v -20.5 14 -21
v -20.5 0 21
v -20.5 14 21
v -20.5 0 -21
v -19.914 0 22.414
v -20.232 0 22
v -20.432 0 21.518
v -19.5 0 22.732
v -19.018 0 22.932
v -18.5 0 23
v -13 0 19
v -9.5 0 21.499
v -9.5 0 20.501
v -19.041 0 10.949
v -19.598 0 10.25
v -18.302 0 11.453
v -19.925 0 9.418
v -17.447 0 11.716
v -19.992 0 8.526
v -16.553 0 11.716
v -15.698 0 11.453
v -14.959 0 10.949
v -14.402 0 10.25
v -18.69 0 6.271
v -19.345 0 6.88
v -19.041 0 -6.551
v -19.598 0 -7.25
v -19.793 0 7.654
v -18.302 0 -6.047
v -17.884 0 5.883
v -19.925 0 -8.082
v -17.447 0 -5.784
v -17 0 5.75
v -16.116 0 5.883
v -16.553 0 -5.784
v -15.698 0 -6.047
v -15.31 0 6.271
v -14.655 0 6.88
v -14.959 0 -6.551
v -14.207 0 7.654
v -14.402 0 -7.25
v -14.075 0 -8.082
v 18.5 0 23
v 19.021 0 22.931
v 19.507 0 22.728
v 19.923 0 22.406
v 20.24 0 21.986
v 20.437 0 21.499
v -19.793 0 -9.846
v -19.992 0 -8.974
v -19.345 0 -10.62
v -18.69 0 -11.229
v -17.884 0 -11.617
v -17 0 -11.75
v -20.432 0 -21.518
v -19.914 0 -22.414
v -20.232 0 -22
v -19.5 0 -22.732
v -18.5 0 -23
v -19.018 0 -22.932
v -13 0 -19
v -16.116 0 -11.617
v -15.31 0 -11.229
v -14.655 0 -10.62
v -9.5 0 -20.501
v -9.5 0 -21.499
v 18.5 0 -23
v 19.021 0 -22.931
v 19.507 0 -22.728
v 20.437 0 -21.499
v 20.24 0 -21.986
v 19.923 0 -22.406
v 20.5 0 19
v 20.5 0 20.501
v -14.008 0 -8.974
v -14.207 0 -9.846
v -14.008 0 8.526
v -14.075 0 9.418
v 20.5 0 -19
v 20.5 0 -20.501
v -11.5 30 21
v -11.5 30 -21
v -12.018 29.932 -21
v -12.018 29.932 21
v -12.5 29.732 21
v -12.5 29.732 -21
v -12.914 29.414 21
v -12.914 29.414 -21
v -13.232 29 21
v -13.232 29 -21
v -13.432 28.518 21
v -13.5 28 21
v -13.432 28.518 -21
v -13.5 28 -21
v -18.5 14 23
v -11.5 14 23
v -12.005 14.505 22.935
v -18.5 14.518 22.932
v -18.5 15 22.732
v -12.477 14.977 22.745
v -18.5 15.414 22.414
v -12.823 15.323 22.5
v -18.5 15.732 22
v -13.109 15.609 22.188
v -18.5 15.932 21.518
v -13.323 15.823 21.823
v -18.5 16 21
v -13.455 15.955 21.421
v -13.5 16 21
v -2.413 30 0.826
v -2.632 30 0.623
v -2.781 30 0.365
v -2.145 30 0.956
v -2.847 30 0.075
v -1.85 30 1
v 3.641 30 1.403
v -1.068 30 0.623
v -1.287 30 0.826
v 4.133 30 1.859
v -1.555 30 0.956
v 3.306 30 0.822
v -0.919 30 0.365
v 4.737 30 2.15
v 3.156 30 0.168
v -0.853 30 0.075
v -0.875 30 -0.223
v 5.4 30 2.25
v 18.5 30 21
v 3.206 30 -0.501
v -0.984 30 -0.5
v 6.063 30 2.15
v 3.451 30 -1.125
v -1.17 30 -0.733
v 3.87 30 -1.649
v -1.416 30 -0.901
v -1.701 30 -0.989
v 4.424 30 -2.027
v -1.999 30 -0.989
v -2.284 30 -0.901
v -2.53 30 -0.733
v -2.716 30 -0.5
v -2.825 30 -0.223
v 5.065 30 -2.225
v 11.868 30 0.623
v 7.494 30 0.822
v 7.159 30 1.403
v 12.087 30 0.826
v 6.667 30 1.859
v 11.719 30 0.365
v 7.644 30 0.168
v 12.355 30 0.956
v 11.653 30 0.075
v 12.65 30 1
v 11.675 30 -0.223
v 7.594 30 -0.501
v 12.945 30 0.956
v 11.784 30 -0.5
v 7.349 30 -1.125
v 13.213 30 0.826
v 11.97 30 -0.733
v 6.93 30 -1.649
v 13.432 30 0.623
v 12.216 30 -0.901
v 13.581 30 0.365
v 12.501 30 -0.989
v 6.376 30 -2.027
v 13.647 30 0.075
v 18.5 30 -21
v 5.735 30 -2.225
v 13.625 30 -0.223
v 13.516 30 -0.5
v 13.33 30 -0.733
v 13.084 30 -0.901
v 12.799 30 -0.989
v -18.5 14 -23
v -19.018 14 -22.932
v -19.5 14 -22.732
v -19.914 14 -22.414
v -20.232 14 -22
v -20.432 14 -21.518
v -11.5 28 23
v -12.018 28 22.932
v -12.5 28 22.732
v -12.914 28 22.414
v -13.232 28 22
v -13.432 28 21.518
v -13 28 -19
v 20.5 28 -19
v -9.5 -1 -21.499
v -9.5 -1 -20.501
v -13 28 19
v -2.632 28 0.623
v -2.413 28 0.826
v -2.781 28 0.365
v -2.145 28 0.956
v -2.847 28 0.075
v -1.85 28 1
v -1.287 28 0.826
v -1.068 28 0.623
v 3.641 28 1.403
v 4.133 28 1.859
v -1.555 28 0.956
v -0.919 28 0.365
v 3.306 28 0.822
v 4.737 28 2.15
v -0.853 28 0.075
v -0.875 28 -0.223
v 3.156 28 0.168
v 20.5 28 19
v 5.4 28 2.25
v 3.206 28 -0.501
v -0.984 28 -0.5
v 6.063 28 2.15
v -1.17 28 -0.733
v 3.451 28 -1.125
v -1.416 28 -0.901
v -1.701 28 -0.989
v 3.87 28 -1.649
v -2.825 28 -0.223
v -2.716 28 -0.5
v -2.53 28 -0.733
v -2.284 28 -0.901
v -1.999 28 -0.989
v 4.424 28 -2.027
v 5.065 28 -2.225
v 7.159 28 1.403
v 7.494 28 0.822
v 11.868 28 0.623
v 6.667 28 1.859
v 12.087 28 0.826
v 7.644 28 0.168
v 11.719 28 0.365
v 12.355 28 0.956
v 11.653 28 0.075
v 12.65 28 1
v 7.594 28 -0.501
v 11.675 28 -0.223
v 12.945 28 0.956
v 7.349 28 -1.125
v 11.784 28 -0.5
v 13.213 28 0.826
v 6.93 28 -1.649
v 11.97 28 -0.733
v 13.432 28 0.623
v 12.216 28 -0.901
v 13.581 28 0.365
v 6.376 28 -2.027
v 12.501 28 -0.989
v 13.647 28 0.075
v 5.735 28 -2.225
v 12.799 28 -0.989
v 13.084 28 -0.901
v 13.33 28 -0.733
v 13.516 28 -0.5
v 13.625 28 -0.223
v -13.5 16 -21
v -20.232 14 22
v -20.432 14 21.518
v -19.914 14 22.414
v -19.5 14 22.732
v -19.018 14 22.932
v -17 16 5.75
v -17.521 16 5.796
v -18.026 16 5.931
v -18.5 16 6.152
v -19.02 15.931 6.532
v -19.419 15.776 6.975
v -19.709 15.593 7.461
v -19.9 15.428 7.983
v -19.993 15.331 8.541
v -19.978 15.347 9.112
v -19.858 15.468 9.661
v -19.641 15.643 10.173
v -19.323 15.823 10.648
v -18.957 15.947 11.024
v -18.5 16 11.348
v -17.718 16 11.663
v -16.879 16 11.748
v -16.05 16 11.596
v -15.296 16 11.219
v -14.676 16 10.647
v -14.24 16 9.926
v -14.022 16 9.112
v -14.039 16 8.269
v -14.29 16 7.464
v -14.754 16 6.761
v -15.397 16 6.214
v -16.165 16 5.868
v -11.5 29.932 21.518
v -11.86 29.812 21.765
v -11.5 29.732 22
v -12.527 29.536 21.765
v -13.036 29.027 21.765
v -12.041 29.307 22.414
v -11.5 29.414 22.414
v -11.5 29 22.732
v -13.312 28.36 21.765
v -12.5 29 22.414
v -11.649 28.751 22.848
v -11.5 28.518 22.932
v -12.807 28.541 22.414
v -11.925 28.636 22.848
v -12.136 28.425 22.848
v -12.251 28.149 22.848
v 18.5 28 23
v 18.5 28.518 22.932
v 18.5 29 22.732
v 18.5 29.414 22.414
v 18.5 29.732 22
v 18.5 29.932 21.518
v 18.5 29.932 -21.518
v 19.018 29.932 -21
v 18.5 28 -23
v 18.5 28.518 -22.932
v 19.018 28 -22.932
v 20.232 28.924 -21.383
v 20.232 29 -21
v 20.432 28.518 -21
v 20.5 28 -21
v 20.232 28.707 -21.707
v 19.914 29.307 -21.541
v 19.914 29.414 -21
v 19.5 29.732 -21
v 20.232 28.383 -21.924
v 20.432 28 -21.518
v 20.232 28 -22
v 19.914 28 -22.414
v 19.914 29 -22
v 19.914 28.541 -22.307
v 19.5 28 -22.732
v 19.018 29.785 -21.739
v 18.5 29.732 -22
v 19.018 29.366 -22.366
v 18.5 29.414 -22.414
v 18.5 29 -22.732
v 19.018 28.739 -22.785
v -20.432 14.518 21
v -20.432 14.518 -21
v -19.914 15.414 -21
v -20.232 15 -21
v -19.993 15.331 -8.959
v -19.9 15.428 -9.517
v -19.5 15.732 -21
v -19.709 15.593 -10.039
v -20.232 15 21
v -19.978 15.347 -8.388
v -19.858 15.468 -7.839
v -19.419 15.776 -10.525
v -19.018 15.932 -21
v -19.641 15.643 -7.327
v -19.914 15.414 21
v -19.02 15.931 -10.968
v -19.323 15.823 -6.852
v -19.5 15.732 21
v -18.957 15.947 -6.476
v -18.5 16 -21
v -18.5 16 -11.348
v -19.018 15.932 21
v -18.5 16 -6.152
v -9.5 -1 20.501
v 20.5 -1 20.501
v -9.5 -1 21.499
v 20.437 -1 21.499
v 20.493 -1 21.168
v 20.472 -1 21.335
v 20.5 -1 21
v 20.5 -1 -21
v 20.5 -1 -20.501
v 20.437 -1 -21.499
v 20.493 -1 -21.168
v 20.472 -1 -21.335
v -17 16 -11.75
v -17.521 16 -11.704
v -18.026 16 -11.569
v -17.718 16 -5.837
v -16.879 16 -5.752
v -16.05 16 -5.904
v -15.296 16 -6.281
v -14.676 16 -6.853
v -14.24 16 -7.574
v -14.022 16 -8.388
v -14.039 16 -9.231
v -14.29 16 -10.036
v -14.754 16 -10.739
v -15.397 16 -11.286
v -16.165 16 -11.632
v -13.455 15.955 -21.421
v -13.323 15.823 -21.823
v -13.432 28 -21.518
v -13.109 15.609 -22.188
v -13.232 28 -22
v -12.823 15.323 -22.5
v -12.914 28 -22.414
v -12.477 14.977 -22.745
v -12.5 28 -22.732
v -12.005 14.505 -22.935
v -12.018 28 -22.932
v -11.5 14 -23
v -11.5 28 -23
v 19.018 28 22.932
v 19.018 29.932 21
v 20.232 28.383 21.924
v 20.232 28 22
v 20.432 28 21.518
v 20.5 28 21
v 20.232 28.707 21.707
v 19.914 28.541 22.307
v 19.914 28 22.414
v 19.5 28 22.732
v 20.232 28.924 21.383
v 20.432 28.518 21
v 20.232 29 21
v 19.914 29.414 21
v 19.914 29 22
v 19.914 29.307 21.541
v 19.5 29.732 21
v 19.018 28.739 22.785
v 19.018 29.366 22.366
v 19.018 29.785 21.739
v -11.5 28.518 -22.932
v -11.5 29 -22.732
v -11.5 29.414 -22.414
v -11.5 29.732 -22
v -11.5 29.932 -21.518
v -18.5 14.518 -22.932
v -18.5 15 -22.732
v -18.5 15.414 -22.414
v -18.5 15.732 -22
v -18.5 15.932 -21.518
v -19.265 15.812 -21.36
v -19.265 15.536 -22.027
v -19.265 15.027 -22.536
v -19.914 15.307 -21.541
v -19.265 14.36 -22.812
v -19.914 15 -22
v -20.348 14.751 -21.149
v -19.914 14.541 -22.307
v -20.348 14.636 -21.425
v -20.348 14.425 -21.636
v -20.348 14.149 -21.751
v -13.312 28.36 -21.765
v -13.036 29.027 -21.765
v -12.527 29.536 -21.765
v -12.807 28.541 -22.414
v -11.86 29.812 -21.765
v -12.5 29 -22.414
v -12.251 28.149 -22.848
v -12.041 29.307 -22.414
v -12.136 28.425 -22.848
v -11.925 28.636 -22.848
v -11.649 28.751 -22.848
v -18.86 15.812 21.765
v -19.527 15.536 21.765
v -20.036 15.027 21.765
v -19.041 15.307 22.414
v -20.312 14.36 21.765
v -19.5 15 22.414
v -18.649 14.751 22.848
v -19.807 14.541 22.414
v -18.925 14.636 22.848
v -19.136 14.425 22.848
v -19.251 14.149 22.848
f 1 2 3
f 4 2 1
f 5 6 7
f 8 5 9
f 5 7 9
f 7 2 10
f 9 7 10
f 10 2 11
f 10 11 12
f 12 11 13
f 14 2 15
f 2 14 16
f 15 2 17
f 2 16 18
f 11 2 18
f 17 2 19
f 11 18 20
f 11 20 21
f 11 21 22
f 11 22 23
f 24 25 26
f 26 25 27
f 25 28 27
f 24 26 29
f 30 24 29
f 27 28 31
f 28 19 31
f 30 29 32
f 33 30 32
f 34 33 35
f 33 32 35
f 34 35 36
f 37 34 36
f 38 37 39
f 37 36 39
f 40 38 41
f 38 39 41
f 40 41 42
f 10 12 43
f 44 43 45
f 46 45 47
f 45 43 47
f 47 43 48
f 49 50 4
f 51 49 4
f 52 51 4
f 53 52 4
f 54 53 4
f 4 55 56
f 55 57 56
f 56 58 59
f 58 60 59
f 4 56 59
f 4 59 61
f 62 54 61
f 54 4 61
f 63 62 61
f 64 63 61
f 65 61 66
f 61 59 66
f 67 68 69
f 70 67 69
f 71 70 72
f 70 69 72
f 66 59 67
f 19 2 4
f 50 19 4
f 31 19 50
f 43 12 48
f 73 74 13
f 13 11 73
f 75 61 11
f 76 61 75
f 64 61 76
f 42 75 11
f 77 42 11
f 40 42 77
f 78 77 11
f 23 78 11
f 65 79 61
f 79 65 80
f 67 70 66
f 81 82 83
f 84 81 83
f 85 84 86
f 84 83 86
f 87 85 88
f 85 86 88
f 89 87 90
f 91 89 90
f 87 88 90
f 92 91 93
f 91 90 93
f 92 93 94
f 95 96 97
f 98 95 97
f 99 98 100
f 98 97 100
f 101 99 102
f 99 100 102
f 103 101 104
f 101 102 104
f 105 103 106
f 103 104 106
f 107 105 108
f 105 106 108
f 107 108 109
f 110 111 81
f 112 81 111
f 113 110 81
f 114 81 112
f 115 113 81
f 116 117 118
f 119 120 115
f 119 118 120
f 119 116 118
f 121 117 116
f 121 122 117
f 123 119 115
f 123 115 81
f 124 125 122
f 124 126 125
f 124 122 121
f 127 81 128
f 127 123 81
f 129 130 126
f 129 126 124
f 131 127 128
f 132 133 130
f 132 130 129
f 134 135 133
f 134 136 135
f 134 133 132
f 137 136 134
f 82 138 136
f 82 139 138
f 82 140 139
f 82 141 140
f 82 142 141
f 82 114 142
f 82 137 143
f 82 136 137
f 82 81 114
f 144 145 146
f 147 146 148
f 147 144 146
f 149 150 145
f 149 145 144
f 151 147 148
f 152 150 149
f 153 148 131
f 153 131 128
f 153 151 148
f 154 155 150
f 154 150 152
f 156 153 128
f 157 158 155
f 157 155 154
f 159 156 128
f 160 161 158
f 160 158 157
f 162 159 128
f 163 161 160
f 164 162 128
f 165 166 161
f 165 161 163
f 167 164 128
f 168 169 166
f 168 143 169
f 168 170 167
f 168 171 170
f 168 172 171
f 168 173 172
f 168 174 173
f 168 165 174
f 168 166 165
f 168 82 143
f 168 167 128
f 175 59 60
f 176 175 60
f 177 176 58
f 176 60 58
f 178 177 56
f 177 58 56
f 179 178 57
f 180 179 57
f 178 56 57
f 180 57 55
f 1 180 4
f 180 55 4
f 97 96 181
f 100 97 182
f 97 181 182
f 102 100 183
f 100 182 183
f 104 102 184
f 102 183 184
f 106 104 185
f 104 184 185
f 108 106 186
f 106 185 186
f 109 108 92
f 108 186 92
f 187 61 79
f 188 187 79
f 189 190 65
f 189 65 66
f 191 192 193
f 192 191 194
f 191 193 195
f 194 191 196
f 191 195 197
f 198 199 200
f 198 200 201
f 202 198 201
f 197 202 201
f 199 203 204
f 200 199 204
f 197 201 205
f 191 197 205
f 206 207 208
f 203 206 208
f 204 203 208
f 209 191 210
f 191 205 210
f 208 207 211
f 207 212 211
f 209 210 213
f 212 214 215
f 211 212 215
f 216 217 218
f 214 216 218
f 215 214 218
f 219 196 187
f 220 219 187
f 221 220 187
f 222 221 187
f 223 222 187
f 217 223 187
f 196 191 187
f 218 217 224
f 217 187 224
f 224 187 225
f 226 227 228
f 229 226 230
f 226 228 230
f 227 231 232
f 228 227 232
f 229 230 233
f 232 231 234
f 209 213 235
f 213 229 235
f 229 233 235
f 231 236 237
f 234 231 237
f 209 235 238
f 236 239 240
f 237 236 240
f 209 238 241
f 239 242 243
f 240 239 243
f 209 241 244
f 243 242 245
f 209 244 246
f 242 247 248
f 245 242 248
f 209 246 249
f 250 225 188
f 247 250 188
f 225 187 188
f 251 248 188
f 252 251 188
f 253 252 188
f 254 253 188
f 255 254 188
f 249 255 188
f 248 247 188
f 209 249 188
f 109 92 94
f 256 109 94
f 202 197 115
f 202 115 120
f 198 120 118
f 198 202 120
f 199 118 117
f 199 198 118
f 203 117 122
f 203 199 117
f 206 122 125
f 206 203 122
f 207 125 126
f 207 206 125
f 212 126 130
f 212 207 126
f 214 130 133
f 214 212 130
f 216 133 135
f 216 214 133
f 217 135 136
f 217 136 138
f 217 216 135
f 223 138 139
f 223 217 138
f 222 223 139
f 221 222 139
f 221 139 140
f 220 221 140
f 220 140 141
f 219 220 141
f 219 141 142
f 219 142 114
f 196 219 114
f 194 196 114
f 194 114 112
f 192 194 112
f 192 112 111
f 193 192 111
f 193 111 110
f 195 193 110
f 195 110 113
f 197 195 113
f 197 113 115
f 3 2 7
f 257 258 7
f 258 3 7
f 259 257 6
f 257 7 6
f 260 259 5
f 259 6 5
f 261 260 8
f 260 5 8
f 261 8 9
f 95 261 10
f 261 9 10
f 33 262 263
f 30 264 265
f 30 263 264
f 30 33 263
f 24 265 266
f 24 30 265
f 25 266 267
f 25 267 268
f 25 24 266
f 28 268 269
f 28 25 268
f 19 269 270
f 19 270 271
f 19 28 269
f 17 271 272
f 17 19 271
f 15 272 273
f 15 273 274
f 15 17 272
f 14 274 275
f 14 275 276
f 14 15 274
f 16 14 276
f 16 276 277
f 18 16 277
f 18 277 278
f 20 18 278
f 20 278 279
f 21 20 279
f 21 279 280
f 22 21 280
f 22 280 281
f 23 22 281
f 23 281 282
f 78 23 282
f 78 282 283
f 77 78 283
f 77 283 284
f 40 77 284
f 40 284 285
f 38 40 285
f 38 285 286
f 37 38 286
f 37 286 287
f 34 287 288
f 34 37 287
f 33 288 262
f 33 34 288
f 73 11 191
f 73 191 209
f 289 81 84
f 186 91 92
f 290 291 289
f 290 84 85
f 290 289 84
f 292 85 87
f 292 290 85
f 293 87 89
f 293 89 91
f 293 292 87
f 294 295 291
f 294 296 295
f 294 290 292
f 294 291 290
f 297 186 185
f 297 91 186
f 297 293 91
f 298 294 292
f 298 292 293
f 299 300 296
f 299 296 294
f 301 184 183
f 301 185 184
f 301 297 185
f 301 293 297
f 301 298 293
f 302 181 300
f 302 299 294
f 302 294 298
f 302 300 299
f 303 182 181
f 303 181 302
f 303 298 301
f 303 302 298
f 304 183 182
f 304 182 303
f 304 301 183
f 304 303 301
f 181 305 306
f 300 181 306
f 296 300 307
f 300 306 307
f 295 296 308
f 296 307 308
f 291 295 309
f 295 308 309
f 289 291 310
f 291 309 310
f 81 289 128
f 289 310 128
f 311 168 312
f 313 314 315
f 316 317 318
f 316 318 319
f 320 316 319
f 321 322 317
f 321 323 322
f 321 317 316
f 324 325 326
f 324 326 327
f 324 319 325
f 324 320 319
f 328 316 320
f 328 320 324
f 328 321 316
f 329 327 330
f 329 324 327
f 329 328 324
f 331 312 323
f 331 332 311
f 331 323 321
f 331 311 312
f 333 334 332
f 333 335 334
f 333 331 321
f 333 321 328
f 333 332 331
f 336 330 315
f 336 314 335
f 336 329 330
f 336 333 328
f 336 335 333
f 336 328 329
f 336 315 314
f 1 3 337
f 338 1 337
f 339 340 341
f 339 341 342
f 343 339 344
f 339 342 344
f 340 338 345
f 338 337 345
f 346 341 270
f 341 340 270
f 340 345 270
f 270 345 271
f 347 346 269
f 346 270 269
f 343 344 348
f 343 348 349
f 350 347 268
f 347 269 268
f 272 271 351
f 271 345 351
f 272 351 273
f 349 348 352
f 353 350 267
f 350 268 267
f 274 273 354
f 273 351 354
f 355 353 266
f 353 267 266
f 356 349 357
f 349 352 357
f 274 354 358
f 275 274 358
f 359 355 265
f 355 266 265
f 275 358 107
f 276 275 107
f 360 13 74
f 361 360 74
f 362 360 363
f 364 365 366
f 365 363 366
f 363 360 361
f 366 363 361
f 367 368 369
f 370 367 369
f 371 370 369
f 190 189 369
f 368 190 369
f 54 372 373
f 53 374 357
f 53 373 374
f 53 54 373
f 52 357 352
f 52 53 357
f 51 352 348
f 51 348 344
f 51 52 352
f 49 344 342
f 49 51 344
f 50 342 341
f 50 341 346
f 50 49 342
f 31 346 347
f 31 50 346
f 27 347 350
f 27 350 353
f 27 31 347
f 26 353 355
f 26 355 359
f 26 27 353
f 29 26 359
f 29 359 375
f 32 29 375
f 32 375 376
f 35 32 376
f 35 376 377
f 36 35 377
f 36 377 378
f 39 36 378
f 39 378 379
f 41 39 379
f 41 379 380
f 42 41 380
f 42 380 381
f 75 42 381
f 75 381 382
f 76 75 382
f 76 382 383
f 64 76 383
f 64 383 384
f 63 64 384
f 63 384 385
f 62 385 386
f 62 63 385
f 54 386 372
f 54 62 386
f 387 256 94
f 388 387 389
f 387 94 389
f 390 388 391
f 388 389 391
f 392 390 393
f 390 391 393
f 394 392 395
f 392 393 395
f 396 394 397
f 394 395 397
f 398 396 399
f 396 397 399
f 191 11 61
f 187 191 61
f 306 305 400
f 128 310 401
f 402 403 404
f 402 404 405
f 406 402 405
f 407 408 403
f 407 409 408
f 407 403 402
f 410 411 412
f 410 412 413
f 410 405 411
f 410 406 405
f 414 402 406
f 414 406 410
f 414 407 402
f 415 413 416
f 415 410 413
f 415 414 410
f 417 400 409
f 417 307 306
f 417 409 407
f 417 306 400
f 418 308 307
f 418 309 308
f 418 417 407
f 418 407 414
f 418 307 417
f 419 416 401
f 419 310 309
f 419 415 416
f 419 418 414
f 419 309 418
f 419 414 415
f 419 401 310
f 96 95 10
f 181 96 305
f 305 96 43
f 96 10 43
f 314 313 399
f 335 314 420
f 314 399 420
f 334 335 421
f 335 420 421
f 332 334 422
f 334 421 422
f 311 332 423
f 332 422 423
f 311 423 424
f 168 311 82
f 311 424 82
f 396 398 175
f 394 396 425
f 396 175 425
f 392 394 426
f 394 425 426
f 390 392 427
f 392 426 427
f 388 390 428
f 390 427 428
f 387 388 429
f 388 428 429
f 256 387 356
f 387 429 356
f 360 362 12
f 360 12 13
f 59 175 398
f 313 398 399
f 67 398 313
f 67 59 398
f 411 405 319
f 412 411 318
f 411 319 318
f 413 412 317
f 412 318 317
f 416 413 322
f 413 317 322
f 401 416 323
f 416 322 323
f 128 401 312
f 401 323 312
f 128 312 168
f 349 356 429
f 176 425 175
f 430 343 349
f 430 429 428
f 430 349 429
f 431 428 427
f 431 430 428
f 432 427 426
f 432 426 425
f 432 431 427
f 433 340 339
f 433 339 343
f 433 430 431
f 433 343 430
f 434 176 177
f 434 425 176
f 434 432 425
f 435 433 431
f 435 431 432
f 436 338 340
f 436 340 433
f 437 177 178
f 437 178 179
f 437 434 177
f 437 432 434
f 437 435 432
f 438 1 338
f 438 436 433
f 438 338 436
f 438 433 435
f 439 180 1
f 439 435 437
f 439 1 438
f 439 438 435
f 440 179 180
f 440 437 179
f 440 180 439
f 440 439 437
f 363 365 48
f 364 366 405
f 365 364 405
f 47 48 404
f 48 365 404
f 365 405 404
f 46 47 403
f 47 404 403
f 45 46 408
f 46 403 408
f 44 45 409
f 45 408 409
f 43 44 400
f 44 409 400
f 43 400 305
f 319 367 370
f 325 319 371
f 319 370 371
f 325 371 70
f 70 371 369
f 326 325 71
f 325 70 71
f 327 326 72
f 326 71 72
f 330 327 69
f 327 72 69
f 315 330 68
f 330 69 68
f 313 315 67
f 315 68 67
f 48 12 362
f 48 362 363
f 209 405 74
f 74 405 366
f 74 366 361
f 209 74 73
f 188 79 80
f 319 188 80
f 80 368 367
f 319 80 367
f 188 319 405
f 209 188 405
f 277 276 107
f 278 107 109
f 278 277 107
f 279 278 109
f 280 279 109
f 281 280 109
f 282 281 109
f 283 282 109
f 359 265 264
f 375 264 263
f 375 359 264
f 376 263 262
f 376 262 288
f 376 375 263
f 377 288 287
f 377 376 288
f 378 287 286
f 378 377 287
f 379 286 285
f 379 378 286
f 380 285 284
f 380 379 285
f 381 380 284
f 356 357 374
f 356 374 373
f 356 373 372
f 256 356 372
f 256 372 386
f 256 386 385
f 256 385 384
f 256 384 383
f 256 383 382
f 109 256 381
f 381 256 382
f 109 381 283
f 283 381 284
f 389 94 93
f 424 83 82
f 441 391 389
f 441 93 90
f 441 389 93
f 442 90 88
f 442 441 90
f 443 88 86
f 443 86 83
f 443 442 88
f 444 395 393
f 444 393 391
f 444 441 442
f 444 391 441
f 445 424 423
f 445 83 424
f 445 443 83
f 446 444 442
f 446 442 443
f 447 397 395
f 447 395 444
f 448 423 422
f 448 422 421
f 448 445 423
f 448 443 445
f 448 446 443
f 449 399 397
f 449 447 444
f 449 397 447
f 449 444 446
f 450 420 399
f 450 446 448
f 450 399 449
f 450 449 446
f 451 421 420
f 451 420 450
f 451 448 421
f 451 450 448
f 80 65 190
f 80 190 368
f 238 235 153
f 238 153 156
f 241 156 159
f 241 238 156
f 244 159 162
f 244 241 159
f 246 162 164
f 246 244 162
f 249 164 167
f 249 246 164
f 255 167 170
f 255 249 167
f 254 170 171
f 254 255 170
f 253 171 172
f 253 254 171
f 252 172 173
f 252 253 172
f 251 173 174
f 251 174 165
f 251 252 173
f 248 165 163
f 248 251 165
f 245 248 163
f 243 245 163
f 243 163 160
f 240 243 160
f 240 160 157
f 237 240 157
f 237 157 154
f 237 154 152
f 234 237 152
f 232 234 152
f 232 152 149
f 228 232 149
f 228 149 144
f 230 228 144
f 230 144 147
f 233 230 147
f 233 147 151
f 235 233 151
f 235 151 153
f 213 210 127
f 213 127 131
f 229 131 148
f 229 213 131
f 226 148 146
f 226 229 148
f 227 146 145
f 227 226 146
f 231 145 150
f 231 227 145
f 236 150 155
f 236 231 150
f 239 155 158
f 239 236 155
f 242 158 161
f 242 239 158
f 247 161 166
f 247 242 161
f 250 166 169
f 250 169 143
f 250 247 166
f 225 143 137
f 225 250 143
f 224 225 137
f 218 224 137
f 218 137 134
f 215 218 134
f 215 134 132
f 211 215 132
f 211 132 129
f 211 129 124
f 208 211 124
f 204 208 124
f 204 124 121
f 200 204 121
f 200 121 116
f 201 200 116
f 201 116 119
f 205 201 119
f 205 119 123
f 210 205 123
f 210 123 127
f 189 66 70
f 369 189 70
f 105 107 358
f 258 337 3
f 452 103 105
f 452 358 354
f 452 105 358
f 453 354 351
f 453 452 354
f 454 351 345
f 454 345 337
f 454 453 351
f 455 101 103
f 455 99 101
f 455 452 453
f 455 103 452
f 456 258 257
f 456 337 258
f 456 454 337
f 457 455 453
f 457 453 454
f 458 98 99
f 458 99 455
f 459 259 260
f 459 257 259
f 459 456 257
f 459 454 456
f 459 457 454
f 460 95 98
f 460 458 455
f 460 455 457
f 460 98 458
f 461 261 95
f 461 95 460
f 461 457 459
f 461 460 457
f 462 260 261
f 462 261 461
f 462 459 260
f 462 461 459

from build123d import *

# Parameters (mm, degrees)
ESQUISSE1_W                  = 41
ESQUISSE1_H                  = 46
ESQUISSE1_R                  = 2.25
ESQUISSE1_R_2                = 1
BOSS_EXTRU_1_DEPTH           = 30
ENL_V_START                  = 30
ESQUISSE2_W                  = 7
ESQUISSE2_H                  = 46
ENL_V_MAT_EXTRU_1_DEPTH      = 14
ENL_V_MAT_EXTRU_3_DEPTH      = 28.002906878
ENL_V_MAT_EXTRU_3_DEPTH_BACK = 44.002906878
ENL_V_MAT_EXTRU_3_START      = 16
ESQUISSE2_3_R                = 3
ESQUISSE3_W                  = 33.5
ESQUISSE3_H                  = 38
ENL_V_MAT_EXTRU_4_DEPTH      = 28
ESQUISSE4_W                  = 30
ESQUISSE4_H                  = 0.997507574
BOSS_EXTRU_2_DEPTH           = 1
CONG_1_R                     = 2
CONG_2_R                     = 2


# Some blends are built 0.0001 mm under size
with BuildPart() as part:
    # Esquisse1 → Boss.-Extru.1 (new body)
    with BuildSketch(Plane(origin=(0, 0, 0), x_dir=(1, 0, 0), z_dir=(0, 1, 0))):
        Rectangle(ESQUISSE1_W, ESQUISSE1_H)
        with Locations(Location((5.4, 0, 0), (0, 0, 270))):
            Circle(ESQUISSE1_R, mode=Mode.SUBTRACT)
        with Locations(Location((-1.85, 0, 0), (0, 0, 270))):
            Circle(ESQUISSE1_R_2, mode=Mode.SUBTRACT)
        with Locations(Location((12.65, 0, 0), (0, 0, 270))):
            Circle(ESQUISSE1_R_2, mode=Mode.SUBTRACT)
    extrude(amount=BOSS_EXTRU_1_DEPTH)

    # Esquisse2 → Enlèv. mat.-Extru.1 (cut)
    with BuildSketch(Plane(origin=(0, 0, 0), x_dir=(1, 0, 0), z_dir=(0, 1, 0)).offset(ENL_V_START)):
        with Locations((-17, 0)):
            Rectangle(ESQUISSE2_W, ESQUISSE2_H)
    extrude(amount=-ENL_V_MAT_EXTRU_1_DEPTH, mode=Mode.SUBTRACT)

    # Esquisse2<3> → Enlèv. mat.-Extru.3 (cut, two sides: drawn at the far end of the back side and taken through both)
    with BuildSketch(Plane(origin=(0, 0, 0), x_dir=(1, 0, 0), z_dir=(0, 1, 0)).offset(ENL_V_MAT_EXTRU_3_START - ENL_V_MAT_EXTRU_3_DEPTH_BACK)):
        with Locations(Location((-17, -8.75, 0), (0, 0, 90))):
            Circle(ESQUISSE2_3_R)
        with Locations(Location((-17, 8.75, 0), (0, 0, 90))):
            Circle(ESQUISSE2_3_R)
    extrude(amount=ENL_V_MAT_EXTRU_3_DEPTH + ENL_V_MAT_EXTRU_3_DEPTH_BACK, mode=Mode.SUBTRACT)

    # Esquisse3 → Enlèv. mat.-Extru.4 (cut)
    with BuildSketch(Plane(origin=(0, 0, 0), x_dir=(1, 0, 0), z_dir=(0, 1, 0))):
        with Locations((3.75, 0)):
            Rectangle(ESQUISSE3_W, ESQUISSE3_H)
    extrude(amount=ENL_V_MAT_EXTRU_4_DEPTH, mode=Mode.SUBTRACT)

    # Esquisse4 → Boss.-Extru.2 (add)
    with BuildSketch(Plane(origin=(0, 0, 0), x_dir=(1, 0, 0), z_dir=(0, 1, 0))):
        with Locations((5.5, -21)):
            Rectangle(ESQUISSE4_W, ESQUISSE4_H)
        with Locations((5.5, 21)):
            Rectangle(ESQUISSE4_W, ESQUISSE4_H)
    extrude(amount=-BOSS_EXTRU_2_DEPTH)

    # Congé1
    # the kernel refuses this fillet: 2 mm, written as the material it takes off along each edge
    with BuildSketch(Plane(origin=(-11.5, 28, -21), x_dir=(-1, 0, 0), z_dir=(0, 0, -1))) as cong_1_piece_1_section:
        Polygon((0, 0), (CONG_1_R, 0), (CONG_1_R, CONG_1_R), (0, CONG_1_R), align=None)
    cong_1_piece_1 = extrude(amount=CONG_1_R, mode=Mode.PRIVATE)
    cong_1_piece_1 = cong_1_piece_1 - Plane(origin=(-11.5, 28, -21), x_dir=(0.7071067811865475, -0.7071067811865475, 0), z_dir=(0, 0, -1)) * Sphere(CONG_1_R, mode=Mode.PRIVATE)
    add(cong_1_piece_1, mode=Mode.SUBTRACT)
    with BuildSketch(Plane(origin=(-18.5, 14, -21), x_dir=(0, 1, 0), z_dir=(-1, 0, 0))) as cong_1_piece_2_section:
        Polygon((0, 0), (CONG_1_R, 0), (CONG_1_R, CONG_1_R), (0, CONG_1_R), align=None)
    cong_1_piece_2 = extrude(amount=CONG_1_R, mode=Mode.PRIVATE)
    cong_1_piece_2 = cong_1_piece_2 - Plane(origin=(-18.5, 14, -21), x_dir=(0, -0.7071067811865475, 0.7071067811865475), z_dir=(-1, 0, 0)) * Sphere(CONG_1_R, mode=Mode.PRIVATE)
    add(cong_1_piece_2, mode=Mode.SUBTRACT)
    with BuildSketch(Plane(origin=(-11.5, 28, 21), x_dir=(-1, 0, 0), z_dir=(0, 0, 1))) as cong_1_piece_3_section:
        Polygon((0, 0), (CONG_1_R, 0), (CONG_1_R, -CONG_1_R), (0, -CONG_1_R), align=None)
    cong_1_piece_3 = extrude(amount=CONG_1_R, mode=Mode.PRIVATE)
    cong_1_piece_3 = cong_1_piece_3 - Plane(origin=(-11.5, 28, 21), x_dir=(0.7071067811865475, -0.7071067811865475, 0), z_dir=(0, 0, 1)) * Sphere(CONG_1_R, mode=Mode.PRIVATE)
    add(cong_1_piece_3, mode=Mode.SUBTRACT)
    with BuildSketch(Plane(origin=(-18.5, 14, 21), x_dir=(-1, 0, 0), z_dir=(0, 0, 1))) as cong_1_piece_4_section:
        Polygon((0, 0), (CONG_1_R, 0), (CONG_1_R, -CONG_1_R), (0, -CONG_1_R), align=None)
    cong_1_piece_4 = extrude(amount=CONG_1_R, mode=Mode.PRIVATE)
    cong_1_piece_4 = cong_1_piece_4 - Plane(origin=(-18.5, 14, 21), x_dir=(0.7071067811865475, -0.7071067811865475, 0), z_dir=(0, 0, 1)) * Sphere(CONG_1_R, mode=Mode.PRIVATE)
    add(cong_1_piece_4, mode=Mode.SUBTRACT)
    with BuildSketch(Plane(origin=(-11.5, 30, -23), x_dir=(0, 0, 1), z_dir=(1, 0, 0))) as cong_1_piece_5:
        with BuildLine():
            CenterArc((CONG_1_R, CONG_1_R), CONG_1_R, 180, 90)
            Line((0, CONG_1_R), (0, 0))
            Line((0, 0), (CONG_1_R, 0))
        make_face()
    extrude(amount=37, mode=Mode.SUBTRACT)
    with BuildSketch(Plane(origin=(-20.5, -5, -23), x_dir=(0, 0, 1), z_dir=(0, 1, 0)), Plane(origin=(-20.5, -5, 23), x_dir=(1, 0, 0), z_dir=(0, 1, 0))) as cong_1_piece_6:
        with BuildLine():
            CenterArc((CONG_1_R, CONG_1_R), CONG_1_R, 180, 90)
            Line((0, CONG_1_R), (0, 0))
            Line((0, 0), (CONG_1_R, 0))
        make_face()
    extrude(amount=19, mode=Mode.SUBTRACT)
    with BuildSketch(Plane(origin=(25.5, 30, 23), x_dir=(0, -1, 0), z_dir=(-1, 0, 0))) as cong_1_piece_7:
        with BuildLine():
            CenterArc((CONG_1_R, -CONG_1_R), CONG_1_R, 90, 90)
            Line((0, -CONG_1_R), (0, 0))
            Line((0, 0), (CONG_1_R, 0))
        make_face()
    extrude(amount=37, mode=Mode.SUBTRACT)
    with BuildSketch(Plane(origin=(-13.5, 16, 23), x_dir=(0, -1, 0), z_dir=(-1, 0, 0))) as cong_1_piece_8:
        with BuildLine():
            CenterArc((CONG_1_R, -CONG_1_R), CONG_1_R, 90, 90)
            Line((0, -CONG_1_R), (0, 0))
            Line((0, 0), (CONG_1_R, 0))
        make_face()
    extrude(amount=5, mode=Mode.SUBTRACT)
    with BuildSketch(Plane(origin=(-13.5, 28, 23), x_dir=(1, 0, 0), z_dir=(0, -1, 0)), Plane(origin=(-13.5, 28, -23), x_dir=(0, 0, 1), z_dir=(0, -1, 0))) as cong_1_piece_9:
        with BuildLine():
            CenterArc((CONG_1_R, -CONG_1_R), CONG_1_R, 90, 90)
            Line((0, -CONG_1_R), (0, 0))
            Line((0, 0), (CONG_1_R, 0))
        make_face()
    extrude(amount=12, mode=Mode.SUBTRACT)
    with BuildSketch(Plane(origin=(-20.5, 16, 21), x_dir=(0, -1, 0), z_dir=(0, 0, -1))) as cong_1_piece_10:
        with BuildLine():
            CenterArc((CONG_1_R, -CONG_1_R), CONG_1_R, 90, 90)
            Line((0, -CONG_1_R), (0, 0))
            Line((0, 0), (CONG_1_R, 0))
        make_face()
    extrude(amount=42, mode=Mode.SUBTRACT)
    with BuildSketch(Plane(origin=(-13.5, 30, -21), x_dir=(0, -1, 0), z_dir=(0, 0, 1))) as cong_1_piece_11:
        with BuildLine():
            CenterArc((CONG_1_R, CONG_1_R), CONG_1_R, 180, 90)
            Line((0, CONG_1_R), (0, 0))
            Line((0, 0), (CONG_1_R, 0))
        make_face()
    extrude(amount=42, mode=Mode.SUBTRACT)
    with BuildSketch(Plane(origin=(-18.5, 16, -23), x_dir=(0, 0, 1), z_dir=(1, 0, 0))) as cong_1_piece_12:
        with BuildLine():
            CenterArc((CONG_1_R, CONG_1_R), CONG_1_R, 180, 90)
            Line((0, CONG_1_R), (0, 0))
            Line((0, 0), (CONG_1_R, 0))
        make_face()
    extrude(amount=5, mode=Mode.SUBTRACT)
    with BuildSketch(Plane(origin=(-8.5, 16, 23), x_dir=(0, -1, 0), z_dir=(-1, 0, 0))) as cong_1_piece_13a_section:
        with BuildLine():
            CenterArc((CONG_1_R, -CONG_1_R), CONG_1_R, 90, 90)
            Line((0, -CONG_1_R), (0, 0))
            Line((0, 0), (CONG_1_R, 0))
        make_face()
    cong_1_piece_13a = extrude(amount=10, mode=Mode.PRIVATE)
    cong_1_piece_13a = split(cong_1_piece_13a, bisect_by=Plane(origin=(-13.5, 15.547209771, 22.547209771), z_dir=(1, 0, 0)), keep=Keep.TOP, mode=Mode.PRIVATE)
    with BuildSketch(Plane(origin=(-13.5, 28, 23), x_dir=(1, 0, 0), z_dir=(0, -1, 0))) as cong_1_piece_13b_section:
        with BuildLine():
            CenterArc((CONG_1_R, -CONG_1_R), CONG_1_R, 90, 90)
            Line((0, -CONG_1_R), (0, 0))
            Line((0, 0), (CONG_1_R, 0))
        make_face()
    cong_1_piece_13b = extrude(amount=17, mode=Mode.PRIVATE)
    cong_1_piece_13b = split(cong_1_piece_13b, bisect_by=Plane(origin=(-13.047209771, 16, 22.547209771), z_dir=(0, -1, 0)), keep=Keep.TOP, mode=Mode.PRIVATE)
    cong_1_piece_13 = cong_1_piece_13a & cong_1_piece_13b
    add(cong_1_piece_13, mode=Mode.SUBTRACT)
    with BuildSketch(Plane(origin=(-18.5, 16, -23), x_dir=(0, 0, 1), z_dir=(1, 0, 0))) as cong_1_piece_14a_section:
        with BuildLine():
            CenterArc((CONG_1_R, CONG_1_R), CONG_1_R, 180, 90)
            Line((0, CONG_1_R), (0, 0))
            Line((0, 0), (CONG_1_R, 0))
        make_face()
    cong_1_piece_14a = extrude(amount=10, mode=Mode.PRIVATE)
    cong_1_piece_14a = split(cong_1_piece_14a, bisect_by=Plane(origin=(-13.5, 15.547209771, -22.547209771), z_dir=(1, 0, 0)), keep=Keep.TOP, mode=Mode.PRIVATE)
    with BuildSketch(Plane(origin=(-13.5, 28, -23), x_dir=(0, 0, 1), z_dir=(0, -1, 0))) as cong_1_piece_14b_section:
        with BuildLine():
            CenterArc((CONG_1_R, -CONG_1_R), CONG_1_R, 90, 90)
            Line((0, -CONG_1_R), (0, 0))
            Line((0, 0), (CONG_1_R, 0))
        make_face()
    cong_1_piece_14b = extrude(amount=17, mode=Mode.PRIVATE)
    cong_1_piece_14b = split(cong_1_piece_14b, bisect_by=Plane(origin=(-13.047209771, 16, -22.547209771), z_dir=(0, -1, 0)), keep=Keep.TOP, mode=Mode.PRIVATE)
    cong_1_piece_14 = cong_1_piece_14a & cong_1_piece_14b
    add(cong_1_piece_14, mode=Mode.SUBTRACT)

    # Congé2
    cong_2_edges = [part.edges().sort_by_distance(p)[0] for p in [
        (20.5, 14, 23),
        (20.5, 29.414213562, 22.414213562),
        (20.5, 14, -23),
        (20.5, 29.414213562, -22.414213562),
        (20.5, 30, 0),
    ]]
    fillet(cong_2_edges, radius=CONG_2_R - 0.0001)  # a hair under: the kernel refuses the full size


solid = part.part
